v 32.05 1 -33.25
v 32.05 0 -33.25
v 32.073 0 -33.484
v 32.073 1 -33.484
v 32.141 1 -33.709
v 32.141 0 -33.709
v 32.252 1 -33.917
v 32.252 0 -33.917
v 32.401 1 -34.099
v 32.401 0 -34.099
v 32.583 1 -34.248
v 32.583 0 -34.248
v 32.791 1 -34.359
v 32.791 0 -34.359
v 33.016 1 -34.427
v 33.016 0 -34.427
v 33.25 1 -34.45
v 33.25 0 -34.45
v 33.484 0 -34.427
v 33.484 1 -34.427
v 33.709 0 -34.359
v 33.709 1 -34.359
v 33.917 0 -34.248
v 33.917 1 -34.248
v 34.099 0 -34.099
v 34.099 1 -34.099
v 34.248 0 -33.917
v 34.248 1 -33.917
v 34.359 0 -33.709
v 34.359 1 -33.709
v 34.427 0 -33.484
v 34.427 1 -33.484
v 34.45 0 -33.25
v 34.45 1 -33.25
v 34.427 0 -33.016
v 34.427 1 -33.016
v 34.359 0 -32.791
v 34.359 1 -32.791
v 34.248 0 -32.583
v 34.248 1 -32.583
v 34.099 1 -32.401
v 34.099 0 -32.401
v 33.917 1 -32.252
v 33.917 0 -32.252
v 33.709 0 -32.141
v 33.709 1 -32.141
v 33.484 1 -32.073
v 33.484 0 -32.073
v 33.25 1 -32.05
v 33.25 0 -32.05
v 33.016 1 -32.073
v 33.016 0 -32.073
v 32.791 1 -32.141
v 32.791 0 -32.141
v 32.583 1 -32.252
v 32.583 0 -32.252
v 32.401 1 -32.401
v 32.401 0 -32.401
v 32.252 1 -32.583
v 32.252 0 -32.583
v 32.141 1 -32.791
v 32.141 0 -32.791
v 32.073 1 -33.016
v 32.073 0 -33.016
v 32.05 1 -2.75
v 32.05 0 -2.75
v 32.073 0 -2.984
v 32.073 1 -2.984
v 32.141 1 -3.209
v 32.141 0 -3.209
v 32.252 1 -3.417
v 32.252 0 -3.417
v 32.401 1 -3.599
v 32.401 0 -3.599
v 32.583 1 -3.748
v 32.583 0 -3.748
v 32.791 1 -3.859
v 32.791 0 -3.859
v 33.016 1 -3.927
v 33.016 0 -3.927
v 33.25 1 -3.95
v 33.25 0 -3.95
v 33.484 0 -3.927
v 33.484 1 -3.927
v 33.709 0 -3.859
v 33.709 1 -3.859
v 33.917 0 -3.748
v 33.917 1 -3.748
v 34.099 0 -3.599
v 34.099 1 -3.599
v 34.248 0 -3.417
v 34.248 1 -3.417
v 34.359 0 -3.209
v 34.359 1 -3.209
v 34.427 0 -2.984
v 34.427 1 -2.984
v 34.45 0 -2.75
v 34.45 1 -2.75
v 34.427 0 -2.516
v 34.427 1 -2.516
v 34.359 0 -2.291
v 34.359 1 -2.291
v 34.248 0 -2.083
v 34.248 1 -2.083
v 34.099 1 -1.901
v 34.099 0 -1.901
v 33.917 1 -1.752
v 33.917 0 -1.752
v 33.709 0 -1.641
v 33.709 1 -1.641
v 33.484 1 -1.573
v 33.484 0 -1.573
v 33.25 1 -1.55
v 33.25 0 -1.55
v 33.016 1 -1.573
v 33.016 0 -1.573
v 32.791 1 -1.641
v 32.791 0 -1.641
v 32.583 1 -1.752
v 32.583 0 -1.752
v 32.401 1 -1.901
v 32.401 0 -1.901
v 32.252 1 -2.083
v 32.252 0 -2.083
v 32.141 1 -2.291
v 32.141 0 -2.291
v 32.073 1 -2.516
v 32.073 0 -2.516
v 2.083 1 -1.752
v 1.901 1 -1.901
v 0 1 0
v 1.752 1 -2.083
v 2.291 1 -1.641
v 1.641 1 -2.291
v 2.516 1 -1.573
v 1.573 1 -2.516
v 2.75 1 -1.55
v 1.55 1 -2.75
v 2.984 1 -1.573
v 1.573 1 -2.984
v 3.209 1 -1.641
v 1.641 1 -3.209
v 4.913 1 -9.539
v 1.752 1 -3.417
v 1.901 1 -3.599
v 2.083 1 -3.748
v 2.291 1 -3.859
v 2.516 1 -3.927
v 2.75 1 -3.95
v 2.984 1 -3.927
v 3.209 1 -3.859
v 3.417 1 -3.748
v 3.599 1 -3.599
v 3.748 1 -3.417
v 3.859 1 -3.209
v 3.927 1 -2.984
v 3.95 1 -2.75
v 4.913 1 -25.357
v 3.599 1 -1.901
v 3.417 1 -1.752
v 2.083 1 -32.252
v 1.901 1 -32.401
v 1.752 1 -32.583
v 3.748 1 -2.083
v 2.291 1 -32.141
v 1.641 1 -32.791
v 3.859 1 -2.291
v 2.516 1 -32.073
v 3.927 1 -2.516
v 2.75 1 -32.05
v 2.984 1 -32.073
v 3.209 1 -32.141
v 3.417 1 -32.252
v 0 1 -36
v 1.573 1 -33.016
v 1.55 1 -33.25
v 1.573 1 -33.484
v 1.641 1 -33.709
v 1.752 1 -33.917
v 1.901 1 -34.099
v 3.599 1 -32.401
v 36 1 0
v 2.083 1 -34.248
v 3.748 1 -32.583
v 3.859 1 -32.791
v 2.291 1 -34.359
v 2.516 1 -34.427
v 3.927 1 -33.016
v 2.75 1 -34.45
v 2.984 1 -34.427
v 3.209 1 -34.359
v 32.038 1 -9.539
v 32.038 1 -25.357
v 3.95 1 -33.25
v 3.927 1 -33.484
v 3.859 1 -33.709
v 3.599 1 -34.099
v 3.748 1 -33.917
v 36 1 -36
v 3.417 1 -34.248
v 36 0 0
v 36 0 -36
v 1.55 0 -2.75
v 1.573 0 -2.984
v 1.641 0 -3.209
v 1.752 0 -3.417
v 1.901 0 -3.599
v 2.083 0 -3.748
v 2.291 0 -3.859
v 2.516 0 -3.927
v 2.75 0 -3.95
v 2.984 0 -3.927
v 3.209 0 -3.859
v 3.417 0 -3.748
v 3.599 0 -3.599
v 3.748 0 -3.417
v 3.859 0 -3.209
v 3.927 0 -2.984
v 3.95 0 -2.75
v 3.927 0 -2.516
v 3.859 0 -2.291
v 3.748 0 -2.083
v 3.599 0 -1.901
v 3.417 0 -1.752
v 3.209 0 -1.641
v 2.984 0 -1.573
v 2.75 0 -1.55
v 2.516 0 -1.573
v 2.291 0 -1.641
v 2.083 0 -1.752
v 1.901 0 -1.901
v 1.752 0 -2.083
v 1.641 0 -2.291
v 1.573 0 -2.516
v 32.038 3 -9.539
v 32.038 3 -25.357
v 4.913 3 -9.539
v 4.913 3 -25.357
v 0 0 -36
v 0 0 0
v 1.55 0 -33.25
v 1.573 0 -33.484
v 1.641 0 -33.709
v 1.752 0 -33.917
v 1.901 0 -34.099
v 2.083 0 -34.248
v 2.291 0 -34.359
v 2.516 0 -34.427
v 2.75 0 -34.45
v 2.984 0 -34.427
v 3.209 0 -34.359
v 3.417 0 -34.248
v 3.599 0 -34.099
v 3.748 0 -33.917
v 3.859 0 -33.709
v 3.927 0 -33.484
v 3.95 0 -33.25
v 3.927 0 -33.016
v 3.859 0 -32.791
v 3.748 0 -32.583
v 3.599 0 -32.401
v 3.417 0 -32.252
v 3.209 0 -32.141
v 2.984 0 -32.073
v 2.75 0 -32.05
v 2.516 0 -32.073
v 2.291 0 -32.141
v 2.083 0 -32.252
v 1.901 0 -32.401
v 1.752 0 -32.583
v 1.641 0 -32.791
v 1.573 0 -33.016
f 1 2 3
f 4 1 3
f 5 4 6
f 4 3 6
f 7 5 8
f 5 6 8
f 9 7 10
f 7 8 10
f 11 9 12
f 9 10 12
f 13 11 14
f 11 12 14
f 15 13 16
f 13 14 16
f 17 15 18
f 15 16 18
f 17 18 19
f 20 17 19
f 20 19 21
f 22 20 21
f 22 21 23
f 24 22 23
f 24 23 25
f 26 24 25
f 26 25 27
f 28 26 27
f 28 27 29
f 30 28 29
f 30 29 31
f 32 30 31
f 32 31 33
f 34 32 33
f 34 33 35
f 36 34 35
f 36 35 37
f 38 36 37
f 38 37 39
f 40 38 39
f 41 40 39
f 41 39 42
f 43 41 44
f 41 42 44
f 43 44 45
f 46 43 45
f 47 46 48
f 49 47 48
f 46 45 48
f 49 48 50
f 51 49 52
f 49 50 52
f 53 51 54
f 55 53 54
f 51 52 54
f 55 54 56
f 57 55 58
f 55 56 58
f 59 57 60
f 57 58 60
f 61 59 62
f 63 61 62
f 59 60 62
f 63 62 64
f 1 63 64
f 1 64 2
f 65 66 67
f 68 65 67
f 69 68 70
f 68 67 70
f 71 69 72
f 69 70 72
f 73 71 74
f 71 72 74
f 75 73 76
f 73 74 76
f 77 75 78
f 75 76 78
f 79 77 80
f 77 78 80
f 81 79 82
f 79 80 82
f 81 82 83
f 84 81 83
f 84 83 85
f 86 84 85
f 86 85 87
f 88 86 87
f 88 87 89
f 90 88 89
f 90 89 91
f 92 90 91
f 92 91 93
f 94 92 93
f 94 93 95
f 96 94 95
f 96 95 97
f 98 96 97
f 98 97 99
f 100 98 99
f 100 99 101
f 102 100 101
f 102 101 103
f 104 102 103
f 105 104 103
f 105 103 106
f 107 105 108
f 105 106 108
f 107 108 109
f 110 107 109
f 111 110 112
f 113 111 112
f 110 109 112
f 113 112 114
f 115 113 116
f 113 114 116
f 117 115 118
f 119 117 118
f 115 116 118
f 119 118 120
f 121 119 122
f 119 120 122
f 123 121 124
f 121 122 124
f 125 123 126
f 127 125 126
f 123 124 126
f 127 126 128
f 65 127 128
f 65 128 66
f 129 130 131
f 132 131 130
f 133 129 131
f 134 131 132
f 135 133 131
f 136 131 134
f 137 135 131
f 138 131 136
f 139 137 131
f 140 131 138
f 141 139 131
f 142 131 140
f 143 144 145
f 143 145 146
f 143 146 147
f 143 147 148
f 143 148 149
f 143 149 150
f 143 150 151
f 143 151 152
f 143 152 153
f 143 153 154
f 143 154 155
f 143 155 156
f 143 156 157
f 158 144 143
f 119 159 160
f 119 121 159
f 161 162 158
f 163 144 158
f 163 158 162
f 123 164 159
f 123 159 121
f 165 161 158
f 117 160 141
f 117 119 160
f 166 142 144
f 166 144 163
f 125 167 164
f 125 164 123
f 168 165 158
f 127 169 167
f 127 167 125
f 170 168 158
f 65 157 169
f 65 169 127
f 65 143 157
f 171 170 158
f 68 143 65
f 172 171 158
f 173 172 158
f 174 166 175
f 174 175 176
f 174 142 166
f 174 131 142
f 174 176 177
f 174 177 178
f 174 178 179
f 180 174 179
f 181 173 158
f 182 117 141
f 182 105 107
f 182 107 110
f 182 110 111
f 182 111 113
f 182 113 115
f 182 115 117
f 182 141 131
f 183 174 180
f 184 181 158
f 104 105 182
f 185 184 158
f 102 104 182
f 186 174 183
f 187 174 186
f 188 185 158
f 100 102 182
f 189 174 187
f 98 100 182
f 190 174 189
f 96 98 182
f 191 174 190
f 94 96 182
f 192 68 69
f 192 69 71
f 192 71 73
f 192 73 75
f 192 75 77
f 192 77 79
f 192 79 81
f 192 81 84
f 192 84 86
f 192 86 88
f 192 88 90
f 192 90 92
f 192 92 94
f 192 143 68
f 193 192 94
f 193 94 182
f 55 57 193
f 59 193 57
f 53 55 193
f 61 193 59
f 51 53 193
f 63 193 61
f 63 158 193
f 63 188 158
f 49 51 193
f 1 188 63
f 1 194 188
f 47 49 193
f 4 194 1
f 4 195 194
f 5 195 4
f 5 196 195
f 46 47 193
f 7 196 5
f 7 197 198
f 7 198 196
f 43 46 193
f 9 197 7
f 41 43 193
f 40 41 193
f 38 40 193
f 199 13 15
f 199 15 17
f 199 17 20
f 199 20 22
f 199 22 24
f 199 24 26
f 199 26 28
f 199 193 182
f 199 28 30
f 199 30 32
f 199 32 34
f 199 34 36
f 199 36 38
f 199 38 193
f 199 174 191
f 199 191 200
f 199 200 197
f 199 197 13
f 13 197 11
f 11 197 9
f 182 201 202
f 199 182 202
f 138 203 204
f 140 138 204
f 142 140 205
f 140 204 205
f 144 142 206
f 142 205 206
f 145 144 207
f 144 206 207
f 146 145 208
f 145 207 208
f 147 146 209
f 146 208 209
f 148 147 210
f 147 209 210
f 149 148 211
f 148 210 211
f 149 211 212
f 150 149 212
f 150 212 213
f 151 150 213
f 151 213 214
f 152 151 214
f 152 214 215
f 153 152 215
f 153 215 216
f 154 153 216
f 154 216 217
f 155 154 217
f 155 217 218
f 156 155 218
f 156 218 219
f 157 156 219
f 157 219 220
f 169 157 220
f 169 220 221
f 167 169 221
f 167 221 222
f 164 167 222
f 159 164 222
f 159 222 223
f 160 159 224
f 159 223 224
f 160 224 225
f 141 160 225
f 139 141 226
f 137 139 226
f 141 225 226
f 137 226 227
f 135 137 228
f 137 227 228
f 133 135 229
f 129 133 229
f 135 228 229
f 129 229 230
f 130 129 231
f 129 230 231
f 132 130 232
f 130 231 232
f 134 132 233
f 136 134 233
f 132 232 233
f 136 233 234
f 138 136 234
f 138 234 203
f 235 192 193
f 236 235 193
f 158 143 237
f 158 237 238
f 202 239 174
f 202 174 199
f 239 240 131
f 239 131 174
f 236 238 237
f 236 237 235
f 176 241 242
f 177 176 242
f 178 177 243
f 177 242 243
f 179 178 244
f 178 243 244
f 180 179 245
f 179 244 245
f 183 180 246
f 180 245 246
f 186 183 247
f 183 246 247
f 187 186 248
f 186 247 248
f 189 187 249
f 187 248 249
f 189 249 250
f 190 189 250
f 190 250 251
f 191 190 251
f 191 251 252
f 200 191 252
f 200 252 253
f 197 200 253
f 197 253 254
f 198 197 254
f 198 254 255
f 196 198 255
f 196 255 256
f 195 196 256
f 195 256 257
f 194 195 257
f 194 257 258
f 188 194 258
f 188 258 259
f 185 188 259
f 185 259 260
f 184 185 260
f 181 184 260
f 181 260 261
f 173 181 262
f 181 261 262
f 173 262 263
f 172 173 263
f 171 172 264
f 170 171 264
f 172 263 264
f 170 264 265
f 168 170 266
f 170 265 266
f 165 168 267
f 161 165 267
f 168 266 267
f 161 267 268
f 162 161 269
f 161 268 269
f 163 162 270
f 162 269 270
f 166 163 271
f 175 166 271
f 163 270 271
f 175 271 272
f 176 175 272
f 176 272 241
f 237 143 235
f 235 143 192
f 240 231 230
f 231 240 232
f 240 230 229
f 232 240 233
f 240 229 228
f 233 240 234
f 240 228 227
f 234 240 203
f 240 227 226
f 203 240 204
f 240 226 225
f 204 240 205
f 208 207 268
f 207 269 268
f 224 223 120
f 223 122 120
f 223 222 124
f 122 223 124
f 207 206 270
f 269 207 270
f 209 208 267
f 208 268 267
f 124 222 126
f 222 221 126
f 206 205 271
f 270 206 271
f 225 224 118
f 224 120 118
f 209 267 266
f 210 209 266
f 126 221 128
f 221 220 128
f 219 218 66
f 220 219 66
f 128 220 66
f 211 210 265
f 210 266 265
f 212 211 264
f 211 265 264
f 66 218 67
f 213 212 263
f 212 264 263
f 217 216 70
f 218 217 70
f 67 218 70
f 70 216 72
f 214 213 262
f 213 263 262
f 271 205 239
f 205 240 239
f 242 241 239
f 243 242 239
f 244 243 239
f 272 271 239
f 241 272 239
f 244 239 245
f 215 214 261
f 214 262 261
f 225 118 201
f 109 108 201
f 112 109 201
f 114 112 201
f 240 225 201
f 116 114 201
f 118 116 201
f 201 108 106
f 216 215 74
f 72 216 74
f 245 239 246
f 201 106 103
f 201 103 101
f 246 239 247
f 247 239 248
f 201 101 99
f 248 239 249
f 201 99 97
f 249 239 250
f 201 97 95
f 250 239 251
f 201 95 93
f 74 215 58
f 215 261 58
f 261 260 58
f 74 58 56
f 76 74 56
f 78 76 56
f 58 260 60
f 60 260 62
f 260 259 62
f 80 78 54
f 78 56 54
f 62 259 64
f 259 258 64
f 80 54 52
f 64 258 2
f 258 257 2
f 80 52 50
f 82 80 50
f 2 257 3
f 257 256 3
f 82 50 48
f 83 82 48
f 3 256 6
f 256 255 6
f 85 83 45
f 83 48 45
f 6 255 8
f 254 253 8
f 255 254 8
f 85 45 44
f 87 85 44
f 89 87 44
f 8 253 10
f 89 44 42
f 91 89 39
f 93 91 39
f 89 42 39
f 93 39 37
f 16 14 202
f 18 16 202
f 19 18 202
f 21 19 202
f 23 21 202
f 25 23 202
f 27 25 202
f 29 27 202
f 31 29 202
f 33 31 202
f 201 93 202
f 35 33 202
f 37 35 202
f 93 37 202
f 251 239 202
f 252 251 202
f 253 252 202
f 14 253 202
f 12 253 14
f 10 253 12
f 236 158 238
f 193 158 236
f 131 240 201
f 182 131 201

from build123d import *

# Parameters (mm, degrees)
ESQUISSE1_W        = 36
ESQUISSE1_H        = 36
BOSS_EXTRU_1_DEPTH = 1
D_GAGEMENT_M21_D   = 2.4
ESQUISSE4_W        = 27.125417606
ESQUISSE4_H        = 15.817725109
BOSS_EXTRU_2_DEPTH = 2


with BuildPart() as part:
    # Esquisse1 → Boss.-Extru.1 (new body)
    with BuildSketch(Plane(origin=(0, 0, 0), x_dir=(1, 0, 0), z_dir=(0, 1, 0))):
        with Locations((18, 18)):
            Rectangle(ESQUISSE1_W, ESQUISSE1_H)
    extrude(amount=BOSS_EXTRU_1_DEPTH)

    # Dégagement M21 (through all)
    with Locations(Plane(origin=(0, 1, 0), x_dir=(1, 0, 0), z_dir=(0, 1, 0))):
        with Locations((2.75, 2.75), (2.75, 33.25), (33.25, 33.25), (33.25, 2.75)):
            Hole(D_GAGEMENT_M21_D / 2)

    # Esquisse4 → Boss.-Extru.2 (add)
    with BuildSketch(Plane(origin=(0, 1, 0), x_dir=(1, 0, 0), z_dir=(0, 1, 0))):
        with Locations((18.47521777, 17.448351925)):
            Rectangle(ESQUISSE4_W, ESQUISSE4_H)
    extrude(amount=BOSS_EXTRU_2_DEPTH)


solid = part.part
